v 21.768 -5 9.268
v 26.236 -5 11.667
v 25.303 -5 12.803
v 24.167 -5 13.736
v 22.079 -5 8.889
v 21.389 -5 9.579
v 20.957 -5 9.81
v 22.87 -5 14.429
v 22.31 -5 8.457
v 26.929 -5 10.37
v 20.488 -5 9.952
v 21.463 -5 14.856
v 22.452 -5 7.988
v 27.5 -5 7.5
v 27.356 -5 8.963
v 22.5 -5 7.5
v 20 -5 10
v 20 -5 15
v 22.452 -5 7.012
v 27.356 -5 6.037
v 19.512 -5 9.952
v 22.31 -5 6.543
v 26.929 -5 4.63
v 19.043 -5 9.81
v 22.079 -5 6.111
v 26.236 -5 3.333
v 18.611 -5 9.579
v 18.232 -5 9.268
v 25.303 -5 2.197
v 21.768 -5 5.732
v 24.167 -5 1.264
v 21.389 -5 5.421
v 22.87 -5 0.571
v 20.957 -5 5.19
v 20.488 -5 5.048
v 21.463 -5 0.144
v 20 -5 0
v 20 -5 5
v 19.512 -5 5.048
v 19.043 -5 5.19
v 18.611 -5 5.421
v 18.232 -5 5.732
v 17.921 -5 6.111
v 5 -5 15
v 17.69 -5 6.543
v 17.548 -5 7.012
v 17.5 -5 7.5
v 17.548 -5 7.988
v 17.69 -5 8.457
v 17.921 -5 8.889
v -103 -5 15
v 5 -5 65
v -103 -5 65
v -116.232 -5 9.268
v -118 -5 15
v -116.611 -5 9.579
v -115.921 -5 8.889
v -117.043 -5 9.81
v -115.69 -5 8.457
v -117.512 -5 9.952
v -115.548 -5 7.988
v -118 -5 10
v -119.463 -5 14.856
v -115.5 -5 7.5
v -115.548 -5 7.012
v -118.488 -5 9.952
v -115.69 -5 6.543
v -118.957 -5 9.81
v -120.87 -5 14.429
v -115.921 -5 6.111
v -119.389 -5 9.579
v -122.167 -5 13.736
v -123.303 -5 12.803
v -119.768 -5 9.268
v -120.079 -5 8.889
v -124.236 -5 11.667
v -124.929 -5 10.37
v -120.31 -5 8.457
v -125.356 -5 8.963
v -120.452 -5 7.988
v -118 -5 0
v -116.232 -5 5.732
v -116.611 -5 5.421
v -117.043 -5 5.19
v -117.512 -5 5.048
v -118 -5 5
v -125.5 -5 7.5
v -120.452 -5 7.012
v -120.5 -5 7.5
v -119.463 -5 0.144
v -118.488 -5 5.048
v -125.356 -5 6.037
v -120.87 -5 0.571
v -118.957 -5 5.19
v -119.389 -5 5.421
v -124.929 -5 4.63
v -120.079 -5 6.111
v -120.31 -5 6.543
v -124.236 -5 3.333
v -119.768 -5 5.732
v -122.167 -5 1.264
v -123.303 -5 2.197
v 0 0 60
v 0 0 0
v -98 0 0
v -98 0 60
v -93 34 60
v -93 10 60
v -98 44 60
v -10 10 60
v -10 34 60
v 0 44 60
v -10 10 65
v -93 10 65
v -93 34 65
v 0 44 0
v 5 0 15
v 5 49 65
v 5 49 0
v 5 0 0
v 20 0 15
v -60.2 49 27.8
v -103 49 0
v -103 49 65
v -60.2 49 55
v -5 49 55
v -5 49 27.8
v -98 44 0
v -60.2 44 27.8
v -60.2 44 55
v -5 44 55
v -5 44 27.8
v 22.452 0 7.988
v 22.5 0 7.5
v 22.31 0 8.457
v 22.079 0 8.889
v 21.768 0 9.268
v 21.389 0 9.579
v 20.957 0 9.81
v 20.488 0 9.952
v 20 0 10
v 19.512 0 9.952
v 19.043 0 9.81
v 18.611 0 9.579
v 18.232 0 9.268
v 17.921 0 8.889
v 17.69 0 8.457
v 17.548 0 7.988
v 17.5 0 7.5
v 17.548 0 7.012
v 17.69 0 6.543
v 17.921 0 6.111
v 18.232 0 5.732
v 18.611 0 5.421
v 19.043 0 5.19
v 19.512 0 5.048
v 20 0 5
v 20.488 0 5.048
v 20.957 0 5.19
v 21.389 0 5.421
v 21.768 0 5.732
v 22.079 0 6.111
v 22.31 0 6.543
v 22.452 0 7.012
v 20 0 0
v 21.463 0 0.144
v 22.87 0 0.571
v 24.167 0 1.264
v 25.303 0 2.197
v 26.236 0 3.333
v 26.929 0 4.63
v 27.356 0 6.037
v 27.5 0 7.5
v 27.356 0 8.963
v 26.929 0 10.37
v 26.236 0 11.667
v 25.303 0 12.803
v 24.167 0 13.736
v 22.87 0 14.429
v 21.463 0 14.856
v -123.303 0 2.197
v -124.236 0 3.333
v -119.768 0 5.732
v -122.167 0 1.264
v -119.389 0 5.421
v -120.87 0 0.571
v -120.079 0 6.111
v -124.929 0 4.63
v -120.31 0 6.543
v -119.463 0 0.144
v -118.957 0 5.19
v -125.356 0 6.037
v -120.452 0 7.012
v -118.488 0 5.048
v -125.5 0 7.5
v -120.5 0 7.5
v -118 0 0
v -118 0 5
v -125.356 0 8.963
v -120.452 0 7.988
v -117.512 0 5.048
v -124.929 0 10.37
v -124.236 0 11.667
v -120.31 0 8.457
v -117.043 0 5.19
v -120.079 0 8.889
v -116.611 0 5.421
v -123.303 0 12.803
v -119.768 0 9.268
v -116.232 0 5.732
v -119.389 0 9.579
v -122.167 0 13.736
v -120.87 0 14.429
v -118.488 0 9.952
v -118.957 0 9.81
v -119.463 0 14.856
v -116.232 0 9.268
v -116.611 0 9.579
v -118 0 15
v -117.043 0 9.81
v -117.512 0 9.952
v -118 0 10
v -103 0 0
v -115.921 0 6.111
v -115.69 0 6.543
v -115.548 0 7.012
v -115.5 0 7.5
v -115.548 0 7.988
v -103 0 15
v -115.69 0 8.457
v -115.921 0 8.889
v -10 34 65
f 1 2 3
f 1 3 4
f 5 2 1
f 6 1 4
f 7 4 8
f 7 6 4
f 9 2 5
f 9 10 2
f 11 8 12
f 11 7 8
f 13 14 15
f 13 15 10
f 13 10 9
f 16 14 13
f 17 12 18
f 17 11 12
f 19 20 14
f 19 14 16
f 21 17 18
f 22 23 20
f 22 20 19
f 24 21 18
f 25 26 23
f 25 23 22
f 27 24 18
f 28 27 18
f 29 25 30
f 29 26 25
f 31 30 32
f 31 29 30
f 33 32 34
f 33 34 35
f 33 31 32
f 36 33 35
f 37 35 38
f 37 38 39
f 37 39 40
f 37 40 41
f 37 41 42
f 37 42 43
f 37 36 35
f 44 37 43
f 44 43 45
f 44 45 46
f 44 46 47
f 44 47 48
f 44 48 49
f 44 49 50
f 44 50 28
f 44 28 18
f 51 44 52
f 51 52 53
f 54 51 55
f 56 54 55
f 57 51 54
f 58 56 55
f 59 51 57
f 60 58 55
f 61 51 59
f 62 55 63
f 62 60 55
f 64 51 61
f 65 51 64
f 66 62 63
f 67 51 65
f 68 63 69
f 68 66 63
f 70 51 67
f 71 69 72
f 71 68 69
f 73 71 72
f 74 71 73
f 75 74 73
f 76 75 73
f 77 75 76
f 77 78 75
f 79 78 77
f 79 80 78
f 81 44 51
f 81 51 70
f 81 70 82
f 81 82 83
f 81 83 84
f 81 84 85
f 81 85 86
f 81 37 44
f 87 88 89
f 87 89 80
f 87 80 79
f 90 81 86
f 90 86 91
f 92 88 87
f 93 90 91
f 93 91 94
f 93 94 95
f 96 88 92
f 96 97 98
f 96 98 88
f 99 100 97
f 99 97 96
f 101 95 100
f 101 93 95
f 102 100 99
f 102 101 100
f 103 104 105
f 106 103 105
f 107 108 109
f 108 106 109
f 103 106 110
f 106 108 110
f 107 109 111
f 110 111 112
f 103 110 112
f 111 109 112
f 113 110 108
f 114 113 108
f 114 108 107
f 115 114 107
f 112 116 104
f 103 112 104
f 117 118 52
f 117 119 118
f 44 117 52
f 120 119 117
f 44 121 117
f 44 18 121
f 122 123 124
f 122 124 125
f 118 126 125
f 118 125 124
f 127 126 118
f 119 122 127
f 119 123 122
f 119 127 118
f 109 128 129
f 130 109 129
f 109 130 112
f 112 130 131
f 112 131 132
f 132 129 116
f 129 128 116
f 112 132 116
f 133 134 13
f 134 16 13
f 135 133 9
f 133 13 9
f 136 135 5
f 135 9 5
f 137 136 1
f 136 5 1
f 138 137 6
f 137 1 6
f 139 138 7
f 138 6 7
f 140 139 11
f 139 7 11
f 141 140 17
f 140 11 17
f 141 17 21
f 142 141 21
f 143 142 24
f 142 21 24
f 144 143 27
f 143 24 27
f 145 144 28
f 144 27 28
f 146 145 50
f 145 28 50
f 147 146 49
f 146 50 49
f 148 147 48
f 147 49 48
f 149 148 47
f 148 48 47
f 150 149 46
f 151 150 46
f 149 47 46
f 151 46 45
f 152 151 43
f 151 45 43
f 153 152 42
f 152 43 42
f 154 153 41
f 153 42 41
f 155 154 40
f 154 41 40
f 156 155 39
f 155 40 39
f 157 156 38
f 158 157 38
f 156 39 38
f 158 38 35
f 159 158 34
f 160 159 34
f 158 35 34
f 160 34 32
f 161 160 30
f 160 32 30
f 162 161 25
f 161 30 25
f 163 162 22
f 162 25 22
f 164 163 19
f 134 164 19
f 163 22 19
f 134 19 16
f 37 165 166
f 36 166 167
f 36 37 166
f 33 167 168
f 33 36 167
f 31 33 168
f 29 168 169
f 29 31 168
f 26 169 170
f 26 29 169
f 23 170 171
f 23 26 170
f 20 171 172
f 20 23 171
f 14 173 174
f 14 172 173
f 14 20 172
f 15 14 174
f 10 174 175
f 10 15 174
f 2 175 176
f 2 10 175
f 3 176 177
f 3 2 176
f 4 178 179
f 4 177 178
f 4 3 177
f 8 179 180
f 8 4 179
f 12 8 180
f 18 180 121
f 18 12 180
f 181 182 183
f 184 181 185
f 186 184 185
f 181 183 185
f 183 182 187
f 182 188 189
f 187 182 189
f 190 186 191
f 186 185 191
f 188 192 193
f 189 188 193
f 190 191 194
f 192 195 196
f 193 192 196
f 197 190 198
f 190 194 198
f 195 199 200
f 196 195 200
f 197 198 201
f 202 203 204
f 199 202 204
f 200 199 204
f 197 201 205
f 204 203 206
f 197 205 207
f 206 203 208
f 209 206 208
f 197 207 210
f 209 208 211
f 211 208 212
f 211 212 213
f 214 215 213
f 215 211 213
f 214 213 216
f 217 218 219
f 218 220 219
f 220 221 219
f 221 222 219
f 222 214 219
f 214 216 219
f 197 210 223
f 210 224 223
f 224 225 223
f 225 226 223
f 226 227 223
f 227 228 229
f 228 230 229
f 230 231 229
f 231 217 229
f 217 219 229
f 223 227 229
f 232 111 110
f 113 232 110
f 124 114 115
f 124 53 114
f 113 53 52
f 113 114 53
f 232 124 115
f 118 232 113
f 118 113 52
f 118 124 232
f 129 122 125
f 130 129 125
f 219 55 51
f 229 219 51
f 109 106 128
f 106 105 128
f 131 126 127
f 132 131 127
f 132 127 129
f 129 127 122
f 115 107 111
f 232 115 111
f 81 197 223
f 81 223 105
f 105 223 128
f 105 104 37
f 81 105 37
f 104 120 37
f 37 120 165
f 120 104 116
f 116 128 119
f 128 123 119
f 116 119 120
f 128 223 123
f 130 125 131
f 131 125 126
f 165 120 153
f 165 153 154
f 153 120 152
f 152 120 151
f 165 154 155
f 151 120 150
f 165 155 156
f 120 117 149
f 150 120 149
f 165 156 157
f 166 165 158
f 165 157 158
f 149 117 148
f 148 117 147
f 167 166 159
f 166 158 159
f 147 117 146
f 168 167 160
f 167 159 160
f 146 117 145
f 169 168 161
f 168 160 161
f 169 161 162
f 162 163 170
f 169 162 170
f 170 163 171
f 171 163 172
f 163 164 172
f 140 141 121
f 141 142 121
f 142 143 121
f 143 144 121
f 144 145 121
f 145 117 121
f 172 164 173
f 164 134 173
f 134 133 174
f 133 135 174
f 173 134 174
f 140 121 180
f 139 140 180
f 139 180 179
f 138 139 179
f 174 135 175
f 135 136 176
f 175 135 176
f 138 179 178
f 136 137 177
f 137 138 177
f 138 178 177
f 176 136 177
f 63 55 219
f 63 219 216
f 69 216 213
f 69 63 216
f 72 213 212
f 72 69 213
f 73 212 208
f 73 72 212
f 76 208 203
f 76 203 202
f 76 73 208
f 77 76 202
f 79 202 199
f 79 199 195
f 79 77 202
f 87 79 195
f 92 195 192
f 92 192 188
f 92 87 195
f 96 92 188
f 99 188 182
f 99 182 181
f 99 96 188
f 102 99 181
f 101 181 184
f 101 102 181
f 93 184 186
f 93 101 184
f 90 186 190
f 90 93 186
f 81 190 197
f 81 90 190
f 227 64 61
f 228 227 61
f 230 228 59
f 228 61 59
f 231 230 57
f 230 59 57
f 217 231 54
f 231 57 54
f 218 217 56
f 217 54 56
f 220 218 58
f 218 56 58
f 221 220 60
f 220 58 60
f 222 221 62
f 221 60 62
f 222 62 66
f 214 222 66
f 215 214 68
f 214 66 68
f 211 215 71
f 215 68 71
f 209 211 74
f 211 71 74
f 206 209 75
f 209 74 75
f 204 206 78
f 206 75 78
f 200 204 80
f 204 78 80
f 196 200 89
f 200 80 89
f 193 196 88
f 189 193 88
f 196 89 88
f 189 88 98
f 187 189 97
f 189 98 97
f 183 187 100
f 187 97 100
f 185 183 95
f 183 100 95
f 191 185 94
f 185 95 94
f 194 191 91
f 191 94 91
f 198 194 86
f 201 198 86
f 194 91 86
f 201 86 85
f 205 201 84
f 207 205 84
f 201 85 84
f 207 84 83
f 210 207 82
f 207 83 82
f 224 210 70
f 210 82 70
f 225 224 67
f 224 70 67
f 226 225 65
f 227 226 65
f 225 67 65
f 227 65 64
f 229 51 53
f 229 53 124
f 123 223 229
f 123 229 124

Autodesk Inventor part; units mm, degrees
ref_plane "YZ Plane" through (0, 0, 0) normal (1, 0, 0) x (0, 1, 0)
ref_plane "XZ Plane" through (0, 0, 0) normal (0, 1, 0) x (-1, 0, 0)
ref_plane "XY Plane" through (0, 0, 0) normal (0, 0, 1) x (1, 0, 0)
sketch "Sketch1" plane through (0, 0, 0) normal (0, 0, 1) x (1, 0, 0)
  line L0 (0, 0) -> (-98, 0)
  line L1 (-98, 0) -> (-98, 44)
  line L2 (-98, 44) -> (0, 44)
  line L3 (0, 44) -> (0, 0)
  line L4 (5, -5) -> (-103, -5)
  line L5 (-103, -5) -> (-103, 49)
  line L6 (-103, 49) -> (5, 49)
  line L7 (5, 49) -> (5, -5)
  dimension "d0" = 98
  dimension "d1" = 44
  dimension "d2" = 5
  dimension "d3" = 5
  dimension "d4" = 5
  dimension "d5" = 5
extrude "Extrusion1" add sketch "Sketch1" along normal blind 60
sketch "Sketch2" plane through (0, 0, 60) normal (0, 0, 1) x (1, 0, 0)
  line L0 (5, 49) -> (-103, 49) projected
  line L1 (5, -5) -> (-103, -5)
  line L2 (-103, -5) -> (-103, 49)
  line L3 (-103, 49) -> (5, 49)
  line L4 (5, 49) -> (5, -5)
  line L5 (-93, 34) -> (-10, 34)
  line L6 (-10, 34) -> (-10, 10)
  line L7 (-10, 10) -> (-93, 10)
  line L8 (-93, 10) -> (-93, 34)
  point P0 (0, 0)
  dimension "d10" = 10
  dimension "d11" = 15
  dimension "d12" = 15
  dimension "d13" = 15
extrude "Extrusion2" add sketch "Sketch2" along normal blind 5
sketch "Sketch4" plane through (-103, 49, 0) normal (0, 1, 0) x (1, 0, 0)
  line L0 (98, -27.8) -> (42.8, -27.8)
  line L1 (42.8, -27.8) -> (42.8, -55)
  line L2 (42.8, -55) -> (98, -55)
  line L3 (98, -55) -> (98, -27.8)
  line L4 (108, -65) -> (0, -65) projected
  line L5 (108, 0) -> (108, -65) projected
  point P0 (103, 0)
  dimension "d19" = 27.2
  dimension "d20" = 55.2
  dimension "d21" = 10
  dimension "d22" = 10
extrude "Extrusion4" cut sketch "Sketch4" against normal blind 10
sketch "Sketch5" plane through (-103, -5, 0) normal (0, -1, 0) x (1, 0, 0)
  line L0 (108, 0) -> (108, 65) projected
  line L1 (108, 0) -> (123, 0)
  line L2 (123, 0) -> (123, 15)
  line L3 (123, 15) -> (108, 15)
  line L4 (108, 15) -> (108, 0)
  circle A0 centre (123, 7.5) radius 7.5
  circle A1 centre (123, 7.5) radius 2.5
  line L5 (103, 0) -> (5, 0) projected
  line L6 (54, 0) -> (54, -10.2425)
  line L7 (0, 0) -> (-15, 0)
  line L8 (-15, 0) -> (-15, 15)
  line L9 (-15, 15) -> (0, 15)
  line L10 (0, 15) -> (0, 0)
  circle A2 centre (-15, 7.5) radius 7.5
  circle A3 centre (-15, 7.5) radius 2.5
  dimension "d25" = 15
  dimension "d26" = 5
  dimension "d27" = 15
extrude "Extrusion5" add sketch "Sketch5" against normal blind 5 contours L0 L3 A0 L1 | A0 L2 A1 | L2 A1 A0 | L7 A2 L9 L10 | A2 L8 A3 | L8 A3 A2
equation "\"d27\" = d25"
equation "\"RodDiameter\" = 8"
equation "\"VerticalBearingOD\" = 16"
equation "\"PrintingClearance\" = 0.2"
equation "\"TubeID\" = 18"
properties part number "PSUBracket"
